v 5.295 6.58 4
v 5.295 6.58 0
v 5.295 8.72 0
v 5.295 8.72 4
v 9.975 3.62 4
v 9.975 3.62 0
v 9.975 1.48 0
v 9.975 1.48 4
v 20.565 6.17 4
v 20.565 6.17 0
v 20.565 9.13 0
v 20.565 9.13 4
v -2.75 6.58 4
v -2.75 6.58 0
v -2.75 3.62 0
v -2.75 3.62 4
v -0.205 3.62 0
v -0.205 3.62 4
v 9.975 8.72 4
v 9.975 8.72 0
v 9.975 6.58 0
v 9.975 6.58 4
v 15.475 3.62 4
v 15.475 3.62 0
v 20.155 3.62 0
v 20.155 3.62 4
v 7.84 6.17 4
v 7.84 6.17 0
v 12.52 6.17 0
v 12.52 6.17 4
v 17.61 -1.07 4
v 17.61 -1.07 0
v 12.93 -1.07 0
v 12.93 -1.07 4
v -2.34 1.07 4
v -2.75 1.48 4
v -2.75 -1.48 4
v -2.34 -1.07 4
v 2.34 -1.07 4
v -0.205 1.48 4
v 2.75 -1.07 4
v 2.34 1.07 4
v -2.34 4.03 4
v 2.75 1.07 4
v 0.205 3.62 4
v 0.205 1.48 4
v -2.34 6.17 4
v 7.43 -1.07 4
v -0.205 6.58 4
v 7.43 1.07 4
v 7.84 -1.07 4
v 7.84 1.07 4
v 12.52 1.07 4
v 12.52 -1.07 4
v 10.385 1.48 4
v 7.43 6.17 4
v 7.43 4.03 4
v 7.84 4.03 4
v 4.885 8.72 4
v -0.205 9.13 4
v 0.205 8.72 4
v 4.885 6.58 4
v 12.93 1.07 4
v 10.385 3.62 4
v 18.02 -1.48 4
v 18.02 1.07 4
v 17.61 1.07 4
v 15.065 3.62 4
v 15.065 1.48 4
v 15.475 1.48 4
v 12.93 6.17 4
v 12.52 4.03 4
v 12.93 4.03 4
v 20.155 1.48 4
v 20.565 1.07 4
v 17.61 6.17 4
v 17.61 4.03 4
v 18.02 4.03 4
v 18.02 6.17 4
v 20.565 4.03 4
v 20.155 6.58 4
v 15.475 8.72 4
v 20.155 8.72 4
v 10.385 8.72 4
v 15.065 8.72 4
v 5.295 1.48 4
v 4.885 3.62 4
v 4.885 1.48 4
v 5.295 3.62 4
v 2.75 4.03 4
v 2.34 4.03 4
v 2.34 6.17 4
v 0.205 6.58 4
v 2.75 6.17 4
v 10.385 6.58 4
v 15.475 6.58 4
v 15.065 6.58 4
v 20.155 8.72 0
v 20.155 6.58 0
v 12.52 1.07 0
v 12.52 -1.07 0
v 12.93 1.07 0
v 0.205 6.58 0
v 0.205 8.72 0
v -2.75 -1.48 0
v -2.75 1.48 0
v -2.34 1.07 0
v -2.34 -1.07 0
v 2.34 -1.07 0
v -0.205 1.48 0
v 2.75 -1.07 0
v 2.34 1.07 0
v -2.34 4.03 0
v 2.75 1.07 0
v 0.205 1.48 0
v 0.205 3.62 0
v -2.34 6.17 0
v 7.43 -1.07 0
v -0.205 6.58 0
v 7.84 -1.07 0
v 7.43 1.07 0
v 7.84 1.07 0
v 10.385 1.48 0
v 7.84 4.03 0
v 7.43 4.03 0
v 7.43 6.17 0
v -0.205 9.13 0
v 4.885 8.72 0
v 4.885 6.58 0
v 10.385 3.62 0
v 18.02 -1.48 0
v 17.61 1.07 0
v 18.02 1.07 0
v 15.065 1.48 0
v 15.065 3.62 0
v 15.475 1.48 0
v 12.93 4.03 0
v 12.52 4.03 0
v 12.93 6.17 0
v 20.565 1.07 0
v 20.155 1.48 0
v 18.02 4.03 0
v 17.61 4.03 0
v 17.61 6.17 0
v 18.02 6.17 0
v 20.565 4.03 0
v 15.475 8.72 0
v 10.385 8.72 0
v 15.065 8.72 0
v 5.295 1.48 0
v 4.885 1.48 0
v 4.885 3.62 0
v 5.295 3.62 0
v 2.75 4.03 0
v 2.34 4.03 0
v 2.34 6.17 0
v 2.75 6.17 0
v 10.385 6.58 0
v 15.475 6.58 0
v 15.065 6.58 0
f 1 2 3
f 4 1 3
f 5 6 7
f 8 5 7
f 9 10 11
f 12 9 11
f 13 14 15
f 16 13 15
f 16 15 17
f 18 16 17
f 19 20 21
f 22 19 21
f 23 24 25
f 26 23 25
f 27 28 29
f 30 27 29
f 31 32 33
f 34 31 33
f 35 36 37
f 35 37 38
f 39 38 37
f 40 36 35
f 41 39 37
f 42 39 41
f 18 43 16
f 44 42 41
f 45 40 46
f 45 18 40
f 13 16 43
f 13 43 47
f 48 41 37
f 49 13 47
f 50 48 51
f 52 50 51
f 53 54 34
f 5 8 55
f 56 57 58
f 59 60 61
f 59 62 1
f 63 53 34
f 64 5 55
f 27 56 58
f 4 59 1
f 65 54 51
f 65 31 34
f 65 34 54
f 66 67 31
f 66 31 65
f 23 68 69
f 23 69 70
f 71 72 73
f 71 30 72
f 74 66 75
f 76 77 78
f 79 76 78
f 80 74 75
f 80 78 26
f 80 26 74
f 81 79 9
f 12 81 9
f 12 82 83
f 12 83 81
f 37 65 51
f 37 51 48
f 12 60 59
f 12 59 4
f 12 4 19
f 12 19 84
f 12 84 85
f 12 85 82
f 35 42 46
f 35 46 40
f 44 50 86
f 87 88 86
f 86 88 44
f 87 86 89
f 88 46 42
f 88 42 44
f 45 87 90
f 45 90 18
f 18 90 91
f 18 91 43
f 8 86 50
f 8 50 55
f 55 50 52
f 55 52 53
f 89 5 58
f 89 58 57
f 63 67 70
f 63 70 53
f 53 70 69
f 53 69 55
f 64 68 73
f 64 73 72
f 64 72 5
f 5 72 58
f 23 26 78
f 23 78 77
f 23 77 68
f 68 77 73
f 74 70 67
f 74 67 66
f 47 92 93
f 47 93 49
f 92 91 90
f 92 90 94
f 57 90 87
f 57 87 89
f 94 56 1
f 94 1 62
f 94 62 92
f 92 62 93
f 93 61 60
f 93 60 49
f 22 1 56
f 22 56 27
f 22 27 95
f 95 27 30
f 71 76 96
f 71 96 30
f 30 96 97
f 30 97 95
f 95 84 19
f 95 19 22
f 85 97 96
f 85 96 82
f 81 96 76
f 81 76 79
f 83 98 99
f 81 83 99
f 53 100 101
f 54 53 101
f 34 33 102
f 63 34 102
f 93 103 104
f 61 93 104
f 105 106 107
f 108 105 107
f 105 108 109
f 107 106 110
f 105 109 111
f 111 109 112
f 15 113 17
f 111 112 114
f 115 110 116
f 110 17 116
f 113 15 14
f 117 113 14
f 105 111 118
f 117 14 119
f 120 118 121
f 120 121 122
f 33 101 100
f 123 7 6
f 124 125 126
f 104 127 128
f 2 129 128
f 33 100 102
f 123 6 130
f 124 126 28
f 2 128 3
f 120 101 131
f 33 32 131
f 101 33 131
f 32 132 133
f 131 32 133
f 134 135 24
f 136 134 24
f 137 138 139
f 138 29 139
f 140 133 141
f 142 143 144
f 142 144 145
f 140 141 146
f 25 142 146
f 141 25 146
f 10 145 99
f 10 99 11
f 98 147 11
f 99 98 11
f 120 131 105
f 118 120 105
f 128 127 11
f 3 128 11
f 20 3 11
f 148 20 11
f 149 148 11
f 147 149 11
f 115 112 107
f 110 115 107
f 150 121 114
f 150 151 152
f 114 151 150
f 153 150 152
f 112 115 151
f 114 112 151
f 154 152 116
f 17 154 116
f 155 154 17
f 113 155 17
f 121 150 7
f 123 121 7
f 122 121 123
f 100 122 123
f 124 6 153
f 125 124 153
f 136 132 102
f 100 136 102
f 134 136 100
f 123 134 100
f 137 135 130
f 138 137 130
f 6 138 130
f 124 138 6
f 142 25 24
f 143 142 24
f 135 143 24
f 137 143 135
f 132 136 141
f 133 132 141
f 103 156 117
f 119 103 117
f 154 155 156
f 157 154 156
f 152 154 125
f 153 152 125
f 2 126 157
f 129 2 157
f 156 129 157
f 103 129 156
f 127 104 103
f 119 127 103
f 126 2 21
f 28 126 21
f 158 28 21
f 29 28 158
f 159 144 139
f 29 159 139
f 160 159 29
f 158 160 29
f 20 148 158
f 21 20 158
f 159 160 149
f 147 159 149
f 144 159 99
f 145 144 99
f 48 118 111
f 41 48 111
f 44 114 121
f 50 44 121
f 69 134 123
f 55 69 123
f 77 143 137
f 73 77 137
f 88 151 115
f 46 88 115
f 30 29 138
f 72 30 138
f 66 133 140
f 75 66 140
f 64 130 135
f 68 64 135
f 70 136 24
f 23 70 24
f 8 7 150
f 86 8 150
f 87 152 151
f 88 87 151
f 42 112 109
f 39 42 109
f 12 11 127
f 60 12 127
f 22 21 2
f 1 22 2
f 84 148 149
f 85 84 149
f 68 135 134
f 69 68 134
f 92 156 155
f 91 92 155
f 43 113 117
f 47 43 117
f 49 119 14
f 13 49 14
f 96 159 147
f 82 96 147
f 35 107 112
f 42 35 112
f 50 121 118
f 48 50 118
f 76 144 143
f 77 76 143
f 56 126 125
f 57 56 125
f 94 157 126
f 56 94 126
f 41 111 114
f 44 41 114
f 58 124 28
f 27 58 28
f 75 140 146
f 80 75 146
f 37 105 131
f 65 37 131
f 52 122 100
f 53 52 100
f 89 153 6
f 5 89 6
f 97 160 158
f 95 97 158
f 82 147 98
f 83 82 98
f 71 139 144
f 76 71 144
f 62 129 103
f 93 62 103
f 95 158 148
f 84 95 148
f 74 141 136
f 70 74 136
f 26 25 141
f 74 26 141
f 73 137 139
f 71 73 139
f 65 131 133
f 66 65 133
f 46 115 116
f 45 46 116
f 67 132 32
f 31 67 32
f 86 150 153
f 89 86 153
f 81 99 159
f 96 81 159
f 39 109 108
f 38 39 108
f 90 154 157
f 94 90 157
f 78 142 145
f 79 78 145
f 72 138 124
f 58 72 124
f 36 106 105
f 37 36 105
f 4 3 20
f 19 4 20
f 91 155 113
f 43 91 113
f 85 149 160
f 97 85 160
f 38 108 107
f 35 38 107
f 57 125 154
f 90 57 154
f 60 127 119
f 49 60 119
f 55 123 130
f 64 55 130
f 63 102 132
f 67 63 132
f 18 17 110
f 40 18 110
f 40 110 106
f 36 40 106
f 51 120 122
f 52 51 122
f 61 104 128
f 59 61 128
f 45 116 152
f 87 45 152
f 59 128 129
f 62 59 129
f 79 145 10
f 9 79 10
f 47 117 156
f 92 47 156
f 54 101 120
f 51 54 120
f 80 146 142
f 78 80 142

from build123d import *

# Parameters (mm, degrees)
EXTRUDE_1_DEPTH = 4


with BuildPart() as part:
    # 草图1 → 凸台-拉伸1 (new body)
    with BuildSketch(Plane.XY):
        Polygon((-2.75, 1.48), (-2.75, -1.48), (2.34, -1.48), (2.75, -1.48), (7.43, -1.48), (7.84, -1.48), (12.52, -1.48), (12.93, -1.48), (18.02, -1.48), (18.02, 1.07), (20.565, 1.07), (20.565, 4.03), (18.02, 4.03), (18.02, 6.17), (20.565, 6.17), (20.565, 9.13), (15.475, 9.13), (15.065, 9.13), (10.385, 9.13), (9.975, 9.13), (5.295, 9.13), (4.885, 9.13), (-0.205, 9.13), (-0.205, 6.58), (-2.75, 6.58), (-2.75, 3.62), (-0.205, 3.62), (-0.205, 1.48), align=None)
        Polygon((-2.34, 1.07), (-0.205, 1.07), (0.205, 1.07), (2.34, 1.07), (2.34, 0.205), (2.34, -0.205), (2.34, -1.07), (0.205, -1.07), (-0.205, -1.07), (-2.34, -1.07), (-2.34, -0.205), (-2.34, 0.205), align=None, mode=Mode.SUBTRACT)
        Polygon((2.75, 0.205), (2.75, 1.07), (4.885, 1.07), (5.295, 1.07), (7.43, 1.07), (7.43, 0.205), (7.43, -0.205), (7.43, -1.07), (5.295, -1.07), (4.885, -1.07), (2.75, -1.07), (2.75, -0.205), align=None, mode=Mode.SUBTRACT)
        Polygon((4.885, 1.48), (2.75, 1.48), (2.34, 1.48), (0.205, 1.48), (0.205, 2.345), (0.205, 2.755), (0.205, 3.62), (2.34, 3.62), (2.75, 3.62), (4.885, 3.62), (4.885, 2.755), (4.885, 2.345), align=None, mode=Mode.SUBTRACT)
        Polygon((9.975, 1.48), (7.84, 1.48), (7.43, 1.48), (5.295, 1.48), (5.295, 2.345), (5.295, 2.755), (5.295, 3.62), (7.43, 3.62), (7.84, 3.62), (9.975, 3.62), (9.975, 2.755), (9.975, 2.345), align=None, mode=Mode.SUBTRACT)
        Polygon((7.84, 0.205), (7.84, 1.07), (9.975, 1.07), (10.385, 1.07), (12.52, 1.07), (12.52, 0.205), (12.52, -0.205), (12.52, -1.07), (10.385, -1.07), (9.975, -1.07), (7.84, -1.07), (7.84, -0.205), align=None, mode=Mode.SUBTRACT)
        Polygon((12.93, 0.205), (12.93, 1.07), (15.065, 1.07), (15.475, 1.07), (17.61, 1.07), (17.61, 0.205), (17.61, -0.205), (17.61, -1.07), (15.475, -1.07), (15.065, -1.07), (12.93, -1.07), (12.93, -0.205), align=None, mode=Mode.SUBTRACT)
        Polygon((15.065, 1.48), (12.93, 1.48), (12.52, 1.48), (10.385, 1.48), (10.385, 2.345), (10.385, 2.755), (10.385, 3.62), (12.52, 3.62), (12.93, 3.62), (15.065, 3.62), (15.065, 2.755), (15.065, 2.345), align=None, mode=Mode.SUBTRACT)
        Polygon((20.155, 3.62), (20.155, 2.755), (20.155, 2.345), (20.155, 1.48), (18.02, 1.48), (17.61, 1.48), (15.475, 1.48), (15.475, 2.345), (15.475, 2.755), (15.475, 3.62), (17.61, 3.62), (18.02, 3.62), align=None, mode=Mode.SUBTRACT)
        Polygon((-0.205, 4.03), (-2.34, 4.03), (-2.34, 4.895), (-2.34, 5.305), (-2.34, 6.17), (-0.205, 6.17), (0.205, 6.17), (2.34, 6.17), (2.34, 5.305), (2.34, 4.895), (2.34, 4.03), (0.205, 4.03), align=None, mode=Mode.SUBTRACT)
        Polygon((4.885, 4.03), (2.75, 4.03), (2.75, 4.895), (2.75, 5.305), (2.75, 6.17), (4.885, 6.17), (5.295, 6.17), (7.43, 6.17), (7.43, 5.305), (7.43, 4.895), (7.43, 4.03), (5.295, 4.03), align=None, mode=Mode.SUBTRACT)
        Polygon((4.885, 6.58), (2.75, 6.58), (2.34, 6.58), (0.205, 6.58), (0.205, 7.445), (0.205, 7.855), (0.205, 8.72), (2.34, 8.72), (2.75, 8.72), (4.885, 8.72), (4.885, 7.855), (4.885, 7.445), align=None, mode=Mode.SUBTRACT)
        Polygon((5.295, 7.445), (5.295, 7.855), (5.295, 8.72), (7.43, 8.72), (7.84, 8.72), (9.975, 8.72), (9.975, 7.855), (9.975, 7.445), (9.975, 6.58), (7.84, 6.58), (7.43, 6.58), (5.295, 6.58), align=None, mode=Mode.SUBTRACT)
        Polygon((9.975, 4.03), (7.84, 4.03), (7.84, 4.895), (7.84, 5.305), (7.84, 6.17), (9.975, 6.17), (10.385, 6.17), (12.52, 6.17), (12.52, 5.305), (12.52, 4.895), (12.52, 4.03), (10.385, 4.03), align=None, mode=Mode.SUBTRACT)
        Polygon((15.065, 4.03), (12.93, 4.03), (12.93, 4.895), (12.93, 5.305), (12.93, 6.17), (15.065, 6.17), (15.475, 6.17), (17.61, 6.17), (17.61, 5.305), (17.61, 4.895), (17.61, 4.03), (15.475, 4.03), align=None, mode=Mode.SUBTRACT)
        Polygon((10.385, 7.445), (10.385, 7.855), (10.385, 8.72), (12.52, 8.72), (12.93, 8.72), (15.065, 8.72), (15.065, 7.855), (15.065, 7.445), (15.065, 6.58), (12.93, 6.58), (12.52, 6.58), (10.385, 6.58), align=None, mode=Mode.SUBTRACT)
        Polygon((15.475, 7.445), (15.475, 7.855), (15.475, 8.72), (17.61, 8.72), (18.02, 8.72), (20.155, 8.72), (20.155, 6.58), (18.02, 6.58), (17.61, 6.58), (15.475, 6.58), align=None, mode=Mode.SUBTRACT)
    extrude(amount=EXTRUDE_1_DEPTH)


solid = part.part
